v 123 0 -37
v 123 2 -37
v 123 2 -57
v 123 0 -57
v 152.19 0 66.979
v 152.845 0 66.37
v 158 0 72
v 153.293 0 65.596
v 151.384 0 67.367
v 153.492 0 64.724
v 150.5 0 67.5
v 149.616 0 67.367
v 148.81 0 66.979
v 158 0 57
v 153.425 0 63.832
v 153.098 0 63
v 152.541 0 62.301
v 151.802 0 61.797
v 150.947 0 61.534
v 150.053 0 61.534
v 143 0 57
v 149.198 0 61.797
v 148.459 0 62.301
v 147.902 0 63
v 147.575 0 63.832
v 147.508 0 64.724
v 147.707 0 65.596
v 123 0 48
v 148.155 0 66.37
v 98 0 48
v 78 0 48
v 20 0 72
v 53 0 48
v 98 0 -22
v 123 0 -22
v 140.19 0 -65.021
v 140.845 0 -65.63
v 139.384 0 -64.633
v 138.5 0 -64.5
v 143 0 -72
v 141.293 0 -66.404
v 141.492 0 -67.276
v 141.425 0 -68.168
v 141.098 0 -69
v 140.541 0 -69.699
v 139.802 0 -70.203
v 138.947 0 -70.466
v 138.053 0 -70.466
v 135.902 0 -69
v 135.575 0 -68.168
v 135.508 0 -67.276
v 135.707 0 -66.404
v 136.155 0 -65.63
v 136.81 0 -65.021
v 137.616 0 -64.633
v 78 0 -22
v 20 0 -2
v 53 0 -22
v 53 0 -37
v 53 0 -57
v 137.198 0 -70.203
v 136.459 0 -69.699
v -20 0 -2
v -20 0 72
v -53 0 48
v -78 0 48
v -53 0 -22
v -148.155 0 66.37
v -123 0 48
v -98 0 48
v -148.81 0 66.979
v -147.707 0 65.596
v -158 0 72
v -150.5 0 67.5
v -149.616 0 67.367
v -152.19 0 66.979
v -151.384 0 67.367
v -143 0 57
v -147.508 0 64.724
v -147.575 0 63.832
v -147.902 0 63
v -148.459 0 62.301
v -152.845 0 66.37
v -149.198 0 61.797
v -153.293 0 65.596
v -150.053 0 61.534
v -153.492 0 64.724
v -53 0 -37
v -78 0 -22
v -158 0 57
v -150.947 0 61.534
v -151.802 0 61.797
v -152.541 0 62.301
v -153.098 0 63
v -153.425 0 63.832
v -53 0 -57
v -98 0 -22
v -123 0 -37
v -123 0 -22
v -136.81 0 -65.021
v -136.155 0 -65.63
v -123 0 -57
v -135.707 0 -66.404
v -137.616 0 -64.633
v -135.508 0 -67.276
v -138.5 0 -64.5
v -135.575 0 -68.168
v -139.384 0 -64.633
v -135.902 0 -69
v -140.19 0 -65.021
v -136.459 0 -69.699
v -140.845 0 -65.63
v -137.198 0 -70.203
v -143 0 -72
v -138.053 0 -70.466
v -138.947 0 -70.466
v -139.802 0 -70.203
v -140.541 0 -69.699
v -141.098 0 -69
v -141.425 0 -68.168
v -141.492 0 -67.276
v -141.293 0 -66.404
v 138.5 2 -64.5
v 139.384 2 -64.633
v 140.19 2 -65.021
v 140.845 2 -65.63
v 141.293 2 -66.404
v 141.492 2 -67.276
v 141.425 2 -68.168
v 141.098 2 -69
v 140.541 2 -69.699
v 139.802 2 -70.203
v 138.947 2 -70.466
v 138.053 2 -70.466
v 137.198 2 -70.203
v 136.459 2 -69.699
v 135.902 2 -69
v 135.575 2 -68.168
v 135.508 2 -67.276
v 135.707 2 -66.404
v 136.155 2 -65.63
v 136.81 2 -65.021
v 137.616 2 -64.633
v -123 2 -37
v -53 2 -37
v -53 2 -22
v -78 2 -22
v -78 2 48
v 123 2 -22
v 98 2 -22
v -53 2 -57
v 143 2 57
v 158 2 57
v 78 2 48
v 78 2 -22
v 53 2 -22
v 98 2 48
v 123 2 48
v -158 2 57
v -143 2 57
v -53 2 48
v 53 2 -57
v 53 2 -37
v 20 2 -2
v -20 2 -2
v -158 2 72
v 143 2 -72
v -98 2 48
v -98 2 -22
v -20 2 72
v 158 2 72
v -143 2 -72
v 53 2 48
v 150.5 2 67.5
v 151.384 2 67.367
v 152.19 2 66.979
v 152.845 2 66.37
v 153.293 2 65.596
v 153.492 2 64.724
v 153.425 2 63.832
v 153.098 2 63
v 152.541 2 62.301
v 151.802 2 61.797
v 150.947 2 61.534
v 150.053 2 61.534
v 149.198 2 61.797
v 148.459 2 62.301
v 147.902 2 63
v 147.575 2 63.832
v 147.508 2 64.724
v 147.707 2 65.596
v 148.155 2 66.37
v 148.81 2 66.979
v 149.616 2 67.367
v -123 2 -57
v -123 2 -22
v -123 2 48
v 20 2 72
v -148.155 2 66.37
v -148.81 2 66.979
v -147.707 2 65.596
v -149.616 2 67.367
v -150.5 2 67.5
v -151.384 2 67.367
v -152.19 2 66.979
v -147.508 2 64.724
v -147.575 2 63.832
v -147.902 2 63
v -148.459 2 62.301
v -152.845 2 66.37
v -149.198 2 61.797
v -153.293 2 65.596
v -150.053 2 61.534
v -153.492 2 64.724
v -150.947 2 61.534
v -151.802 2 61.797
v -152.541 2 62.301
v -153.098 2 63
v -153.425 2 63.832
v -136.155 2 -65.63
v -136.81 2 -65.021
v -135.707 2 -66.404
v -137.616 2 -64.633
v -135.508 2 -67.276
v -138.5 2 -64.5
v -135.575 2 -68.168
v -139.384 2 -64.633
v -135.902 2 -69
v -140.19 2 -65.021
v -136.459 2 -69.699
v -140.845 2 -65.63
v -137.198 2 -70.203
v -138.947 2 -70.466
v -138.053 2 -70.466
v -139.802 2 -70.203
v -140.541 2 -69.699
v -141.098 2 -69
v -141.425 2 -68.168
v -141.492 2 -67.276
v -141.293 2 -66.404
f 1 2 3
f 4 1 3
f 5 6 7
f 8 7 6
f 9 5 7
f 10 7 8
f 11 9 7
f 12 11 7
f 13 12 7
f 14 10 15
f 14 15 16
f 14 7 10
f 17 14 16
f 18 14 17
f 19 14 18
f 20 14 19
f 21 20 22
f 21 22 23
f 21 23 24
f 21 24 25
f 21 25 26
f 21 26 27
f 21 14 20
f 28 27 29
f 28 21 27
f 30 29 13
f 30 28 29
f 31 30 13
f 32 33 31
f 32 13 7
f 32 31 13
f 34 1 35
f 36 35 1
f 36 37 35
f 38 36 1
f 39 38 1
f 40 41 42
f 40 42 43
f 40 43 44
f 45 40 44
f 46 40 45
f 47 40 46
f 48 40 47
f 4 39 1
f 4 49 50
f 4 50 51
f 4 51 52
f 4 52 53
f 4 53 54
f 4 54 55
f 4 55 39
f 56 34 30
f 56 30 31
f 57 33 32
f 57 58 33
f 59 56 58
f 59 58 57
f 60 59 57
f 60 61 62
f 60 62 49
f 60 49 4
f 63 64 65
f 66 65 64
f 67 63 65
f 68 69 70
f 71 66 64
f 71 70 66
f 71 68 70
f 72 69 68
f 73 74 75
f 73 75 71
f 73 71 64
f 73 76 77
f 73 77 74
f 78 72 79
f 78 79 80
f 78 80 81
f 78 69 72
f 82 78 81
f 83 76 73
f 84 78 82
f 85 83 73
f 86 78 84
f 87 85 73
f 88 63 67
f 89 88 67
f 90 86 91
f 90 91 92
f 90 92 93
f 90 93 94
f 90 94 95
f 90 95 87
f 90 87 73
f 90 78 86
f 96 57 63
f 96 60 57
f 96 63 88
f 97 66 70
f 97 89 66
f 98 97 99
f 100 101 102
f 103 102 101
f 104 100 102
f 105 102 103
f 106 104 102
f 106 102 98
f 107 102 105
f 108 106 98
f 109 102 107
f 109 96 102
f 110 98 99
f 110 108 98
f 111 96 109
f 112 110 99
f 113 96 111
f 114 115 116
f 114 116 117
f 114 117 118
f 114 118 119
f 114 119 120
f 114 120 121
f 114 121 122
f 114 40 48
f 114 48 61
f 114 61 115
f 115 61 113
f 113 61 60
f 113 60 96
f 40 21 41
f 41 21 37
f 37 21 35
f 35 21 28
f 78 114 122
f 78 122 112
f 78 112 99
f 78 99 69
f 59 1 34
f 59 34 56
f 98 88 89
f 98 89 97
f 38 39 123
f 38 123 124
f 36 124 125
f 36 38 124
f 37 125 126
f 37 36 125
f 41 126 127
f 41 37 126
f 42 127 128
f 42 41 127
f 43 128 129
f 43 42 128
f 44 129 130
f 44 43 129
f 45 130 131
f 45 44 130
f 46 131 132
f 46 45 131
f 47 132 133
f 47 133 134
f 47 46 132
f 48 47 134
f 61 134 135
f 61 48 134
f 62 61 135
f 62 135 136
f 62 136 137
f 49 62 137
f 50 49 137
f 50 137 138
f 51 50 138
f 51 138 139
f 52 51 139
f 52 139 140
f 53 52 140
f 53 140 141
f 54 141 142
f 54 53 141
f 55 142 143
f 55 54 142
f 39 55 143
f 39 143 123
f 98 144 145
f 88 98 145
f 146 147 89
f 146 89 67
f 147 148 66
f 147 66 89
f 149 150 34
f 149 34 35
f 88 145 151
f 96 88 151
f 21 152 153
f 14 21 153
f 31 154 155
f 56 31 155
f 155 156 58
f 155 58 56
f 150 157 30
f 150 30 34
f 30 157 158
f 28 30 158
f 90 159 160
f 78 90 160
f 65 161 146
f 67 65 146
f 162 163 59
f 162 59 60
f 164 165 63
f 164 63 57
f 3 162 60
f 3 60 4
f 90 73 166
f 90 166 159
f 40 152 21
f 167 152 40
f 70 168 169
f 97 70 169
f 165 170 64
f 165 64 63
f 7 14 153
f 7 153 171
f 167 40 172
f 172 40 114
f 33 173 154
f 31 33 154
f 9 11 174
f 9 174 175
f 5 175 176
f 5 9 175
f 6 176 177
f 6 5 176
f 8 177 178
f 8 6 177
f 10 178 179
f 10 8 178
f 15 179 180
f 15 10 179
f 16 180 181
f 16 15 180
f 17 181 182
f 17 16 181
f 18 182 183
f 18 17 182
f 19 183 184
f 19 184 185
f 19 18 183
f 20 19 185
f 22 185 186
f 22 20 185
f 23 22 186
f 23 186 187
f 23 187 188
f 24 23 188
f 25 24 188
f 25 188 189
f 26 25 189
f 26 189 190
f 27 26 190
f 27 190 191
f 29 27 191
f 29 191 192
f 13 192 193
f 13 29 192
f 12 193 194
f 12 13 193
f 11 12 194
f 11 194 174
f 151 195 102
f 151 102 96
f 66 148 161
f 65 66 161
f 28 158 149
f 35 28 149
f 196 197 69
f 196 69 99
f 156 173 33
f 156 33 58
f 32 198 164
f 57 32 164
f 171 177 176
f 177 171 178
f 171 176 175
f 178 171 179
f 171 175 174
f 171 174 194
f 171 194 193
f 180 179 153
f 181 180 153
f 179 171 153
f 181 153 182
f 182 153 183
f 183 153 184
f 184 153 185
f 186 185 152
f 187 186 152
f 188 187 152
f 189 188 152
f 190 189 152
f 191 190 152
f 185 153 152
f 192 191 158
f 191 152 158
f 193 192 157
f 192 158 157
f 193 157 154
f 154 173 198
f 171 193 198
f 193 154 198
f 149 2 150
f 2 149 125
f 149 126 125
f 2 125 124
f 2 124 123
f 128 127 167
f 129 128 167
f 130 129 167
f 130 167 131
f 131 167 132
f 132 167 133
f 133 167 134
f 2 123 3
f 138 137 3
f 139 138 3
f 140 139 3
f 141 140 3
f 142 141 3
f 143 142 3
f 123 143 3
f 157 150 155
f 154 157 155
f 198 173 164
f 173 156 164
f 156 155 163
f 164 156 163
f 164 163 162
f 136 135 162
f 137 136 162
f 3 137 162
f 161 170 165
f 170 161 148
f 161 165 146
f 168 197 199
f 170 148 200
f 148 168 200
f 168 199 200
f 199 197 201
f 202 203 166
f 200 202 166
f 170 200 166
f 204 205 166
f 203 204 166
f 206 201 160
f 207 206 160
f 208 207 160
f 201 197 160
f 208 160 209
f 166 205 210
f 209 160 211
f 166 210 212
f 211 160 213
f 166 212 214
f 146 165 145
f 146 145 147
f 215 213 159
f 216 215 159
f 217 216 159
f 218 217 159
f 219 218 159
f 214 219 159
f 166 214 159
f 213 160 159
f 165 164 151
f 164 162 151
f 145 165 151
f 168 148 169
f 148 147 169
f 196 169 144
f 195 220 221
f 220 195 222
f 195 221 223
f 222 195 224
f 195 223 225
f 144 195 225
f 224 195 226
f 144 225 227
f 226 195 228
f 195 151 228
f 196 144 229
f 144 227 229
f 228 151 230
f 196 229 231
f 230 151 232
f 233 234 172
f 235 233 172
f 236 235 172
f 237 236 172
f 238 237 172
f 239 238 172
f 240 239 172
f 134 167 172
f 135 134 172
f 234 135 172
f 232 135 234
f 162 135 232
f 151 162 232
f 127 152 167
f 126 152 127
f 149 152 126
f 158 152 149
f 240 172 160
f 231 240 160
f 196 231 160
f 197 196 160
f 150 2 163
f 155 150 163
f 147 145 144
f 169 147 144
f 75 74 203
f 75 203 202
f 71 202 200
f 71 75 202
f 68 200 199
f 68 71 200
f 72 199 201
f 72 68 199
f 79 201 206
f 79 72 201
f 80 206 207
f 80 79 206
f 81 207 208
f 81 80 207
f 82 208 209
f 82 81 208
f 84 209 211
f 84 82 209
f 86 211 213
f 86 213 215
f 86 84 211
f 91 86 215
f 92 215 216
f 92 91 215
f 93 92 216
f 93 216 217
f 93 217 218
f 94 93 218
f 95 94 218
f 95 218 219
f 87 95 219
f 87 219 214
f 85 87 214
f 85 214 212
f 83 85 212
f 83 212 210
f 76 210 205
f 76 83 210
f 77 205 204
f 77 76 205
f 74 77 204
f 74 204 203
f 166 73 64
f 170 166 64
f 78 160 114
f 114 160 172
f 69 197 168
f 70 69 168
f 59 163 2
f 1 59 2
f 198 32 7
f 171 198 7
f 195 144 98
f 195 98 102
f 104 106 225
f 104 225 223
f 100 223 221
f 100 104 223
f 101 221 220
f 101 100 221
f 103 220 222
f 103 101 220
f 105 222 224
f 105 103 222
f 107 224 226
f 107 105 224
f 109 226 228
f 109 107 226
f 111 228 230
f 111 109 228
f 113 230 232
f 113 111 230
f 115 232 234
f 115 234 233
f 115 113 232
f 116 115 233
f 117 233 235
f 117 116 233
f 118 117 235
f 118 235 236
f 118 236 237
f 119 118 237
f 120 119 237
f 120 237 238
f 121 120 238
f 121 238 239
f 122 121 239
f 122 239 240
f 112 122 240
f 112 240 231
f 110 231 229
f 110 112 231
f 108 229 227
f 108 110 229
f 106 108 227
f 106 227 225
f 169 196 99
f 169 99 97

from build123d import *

# Parameters (mm, degrees)
SKETCH_1_R          = 3
EXTRUDE_1_DEPTH     = 2
SKETCH_2_W          = 15
SKETCH_2_H          = 129
CUT_EXTRUDE_1_DEPTH = 174.643312569
SKETCH_3_W          = 40
SKETCH_3_H          = 74
CUT_EXTRUDE_2_DEPTH = 174.643312569
SKETCH_4_W          = 70
SKETCH_4_H          = 20
SKETCH_4_W_2        = 25
SKETCH_4_H_2        = 70
CUT_EXTRUDE_3_DEPTH = 174.643312569


with BuildPart() as part:
    # Эскиз1 → Бобышка-Вытянуть1 (new body)
    with BuildSketch(Plane(origin=(0, 0, 0), x_dir=(1, 0, 0), z_dir=(0, 1, 0))):
        Polygon((-143, 72), (158, 72), (158, -72), (-143, -72), (-158, -72), (-158, 72), align=None)
        with Locations(Location((-138.5, 67.5, 0), (0, 0, 270))):
            Circle(SKETCH_1_R, mode=Mode.SUBTRACT)
        with Locations(Location((-150.5, -64.5, 0), (0, 0, 270))):
            Circle(SKETCH_1_R, mode=Mode.SUBTRACT)
        with Locations(Location((150.5, -64.5, 0), (0, 0, 270))):
            Circle(SKETCH_1_R, mode=Mode.SUBTRACT)
        with Locations(Location((138.5, 67.5, 0), (0, 0, 270))):
            Circle(SKETCH_1_R, mode=Mode.SUBTRACT)
    extrude(amount=EXTRUDE_1_DEPTH)

    # Эскиз2 → Вырез-Вытянуть1 (cut, through all)
    with BuildSketch(Plane(origin=(0, 2, 0), x_dir=(1, 0, 0), z_dir=(0, 1, 0))):
        with Locations((150.5, 7.5)):
            Rectangle(SKETCH_2_W, SKETCH_2_H)
        with Locations((-150.5, 7.5)):
            Rectangle(SKETCH_2_W, SKETCH_2_H)
    extrude(amount=-CUT_EXTRUDE_1_DEPTH, mode=Mode.SUBTRACT)

    # Эскиз3 → Вырез-Вытянуть2 (cut, through all)
    with BuildSketch(Plane(origin=(0, 2, 0), x_dir=(1, 0, 0), z_dir=(0, 1, 0))):
        with Locations((0, -35)):
            Rectangle(SKETCH_3_W, SKETCH_3_H)
    extrude(amount=-CUT_EXTRUDE_2_DEPTH, mode=Mode.SUBTRACT)

    # Эскиз4 → Вырез-Вытянуть3 (cut, through all)
    with BuildSketch(Plane(origin=(0, 2, 0), x_dir=(1, 0, 0), z_dir=(0, 1, 0))):
        with Locations((-88, 47)):
            Rectangle(SKETCH_4_W, SKETCH_4_H)
        with Locations((-110.5, -13)):
            Rectangle(SKETCH_4_W_2, SKETCH_4_H_2)
        with Locations((-65.5, -13)):
            Rectangle(SKETCH_4_W_2, SKETCH_4_H_2)
        with Locations((65.5, -13)):
            Rectangle(SKETCH_4_W_2, SKETCH_4_H_2)
        with Locations((110.5, -13)):
            Rectangle(SKETCH_4_W_2, SKETCH_4_H_2)
        with Locations((88, 47)):
            Rectangle(SKETCH_4_W, SKETCH_4_H)
    extrude(amount=-CUT_EXTRUDE_3_DEPTH, mode=Mode.SUBTRACT)


solid = part.part
